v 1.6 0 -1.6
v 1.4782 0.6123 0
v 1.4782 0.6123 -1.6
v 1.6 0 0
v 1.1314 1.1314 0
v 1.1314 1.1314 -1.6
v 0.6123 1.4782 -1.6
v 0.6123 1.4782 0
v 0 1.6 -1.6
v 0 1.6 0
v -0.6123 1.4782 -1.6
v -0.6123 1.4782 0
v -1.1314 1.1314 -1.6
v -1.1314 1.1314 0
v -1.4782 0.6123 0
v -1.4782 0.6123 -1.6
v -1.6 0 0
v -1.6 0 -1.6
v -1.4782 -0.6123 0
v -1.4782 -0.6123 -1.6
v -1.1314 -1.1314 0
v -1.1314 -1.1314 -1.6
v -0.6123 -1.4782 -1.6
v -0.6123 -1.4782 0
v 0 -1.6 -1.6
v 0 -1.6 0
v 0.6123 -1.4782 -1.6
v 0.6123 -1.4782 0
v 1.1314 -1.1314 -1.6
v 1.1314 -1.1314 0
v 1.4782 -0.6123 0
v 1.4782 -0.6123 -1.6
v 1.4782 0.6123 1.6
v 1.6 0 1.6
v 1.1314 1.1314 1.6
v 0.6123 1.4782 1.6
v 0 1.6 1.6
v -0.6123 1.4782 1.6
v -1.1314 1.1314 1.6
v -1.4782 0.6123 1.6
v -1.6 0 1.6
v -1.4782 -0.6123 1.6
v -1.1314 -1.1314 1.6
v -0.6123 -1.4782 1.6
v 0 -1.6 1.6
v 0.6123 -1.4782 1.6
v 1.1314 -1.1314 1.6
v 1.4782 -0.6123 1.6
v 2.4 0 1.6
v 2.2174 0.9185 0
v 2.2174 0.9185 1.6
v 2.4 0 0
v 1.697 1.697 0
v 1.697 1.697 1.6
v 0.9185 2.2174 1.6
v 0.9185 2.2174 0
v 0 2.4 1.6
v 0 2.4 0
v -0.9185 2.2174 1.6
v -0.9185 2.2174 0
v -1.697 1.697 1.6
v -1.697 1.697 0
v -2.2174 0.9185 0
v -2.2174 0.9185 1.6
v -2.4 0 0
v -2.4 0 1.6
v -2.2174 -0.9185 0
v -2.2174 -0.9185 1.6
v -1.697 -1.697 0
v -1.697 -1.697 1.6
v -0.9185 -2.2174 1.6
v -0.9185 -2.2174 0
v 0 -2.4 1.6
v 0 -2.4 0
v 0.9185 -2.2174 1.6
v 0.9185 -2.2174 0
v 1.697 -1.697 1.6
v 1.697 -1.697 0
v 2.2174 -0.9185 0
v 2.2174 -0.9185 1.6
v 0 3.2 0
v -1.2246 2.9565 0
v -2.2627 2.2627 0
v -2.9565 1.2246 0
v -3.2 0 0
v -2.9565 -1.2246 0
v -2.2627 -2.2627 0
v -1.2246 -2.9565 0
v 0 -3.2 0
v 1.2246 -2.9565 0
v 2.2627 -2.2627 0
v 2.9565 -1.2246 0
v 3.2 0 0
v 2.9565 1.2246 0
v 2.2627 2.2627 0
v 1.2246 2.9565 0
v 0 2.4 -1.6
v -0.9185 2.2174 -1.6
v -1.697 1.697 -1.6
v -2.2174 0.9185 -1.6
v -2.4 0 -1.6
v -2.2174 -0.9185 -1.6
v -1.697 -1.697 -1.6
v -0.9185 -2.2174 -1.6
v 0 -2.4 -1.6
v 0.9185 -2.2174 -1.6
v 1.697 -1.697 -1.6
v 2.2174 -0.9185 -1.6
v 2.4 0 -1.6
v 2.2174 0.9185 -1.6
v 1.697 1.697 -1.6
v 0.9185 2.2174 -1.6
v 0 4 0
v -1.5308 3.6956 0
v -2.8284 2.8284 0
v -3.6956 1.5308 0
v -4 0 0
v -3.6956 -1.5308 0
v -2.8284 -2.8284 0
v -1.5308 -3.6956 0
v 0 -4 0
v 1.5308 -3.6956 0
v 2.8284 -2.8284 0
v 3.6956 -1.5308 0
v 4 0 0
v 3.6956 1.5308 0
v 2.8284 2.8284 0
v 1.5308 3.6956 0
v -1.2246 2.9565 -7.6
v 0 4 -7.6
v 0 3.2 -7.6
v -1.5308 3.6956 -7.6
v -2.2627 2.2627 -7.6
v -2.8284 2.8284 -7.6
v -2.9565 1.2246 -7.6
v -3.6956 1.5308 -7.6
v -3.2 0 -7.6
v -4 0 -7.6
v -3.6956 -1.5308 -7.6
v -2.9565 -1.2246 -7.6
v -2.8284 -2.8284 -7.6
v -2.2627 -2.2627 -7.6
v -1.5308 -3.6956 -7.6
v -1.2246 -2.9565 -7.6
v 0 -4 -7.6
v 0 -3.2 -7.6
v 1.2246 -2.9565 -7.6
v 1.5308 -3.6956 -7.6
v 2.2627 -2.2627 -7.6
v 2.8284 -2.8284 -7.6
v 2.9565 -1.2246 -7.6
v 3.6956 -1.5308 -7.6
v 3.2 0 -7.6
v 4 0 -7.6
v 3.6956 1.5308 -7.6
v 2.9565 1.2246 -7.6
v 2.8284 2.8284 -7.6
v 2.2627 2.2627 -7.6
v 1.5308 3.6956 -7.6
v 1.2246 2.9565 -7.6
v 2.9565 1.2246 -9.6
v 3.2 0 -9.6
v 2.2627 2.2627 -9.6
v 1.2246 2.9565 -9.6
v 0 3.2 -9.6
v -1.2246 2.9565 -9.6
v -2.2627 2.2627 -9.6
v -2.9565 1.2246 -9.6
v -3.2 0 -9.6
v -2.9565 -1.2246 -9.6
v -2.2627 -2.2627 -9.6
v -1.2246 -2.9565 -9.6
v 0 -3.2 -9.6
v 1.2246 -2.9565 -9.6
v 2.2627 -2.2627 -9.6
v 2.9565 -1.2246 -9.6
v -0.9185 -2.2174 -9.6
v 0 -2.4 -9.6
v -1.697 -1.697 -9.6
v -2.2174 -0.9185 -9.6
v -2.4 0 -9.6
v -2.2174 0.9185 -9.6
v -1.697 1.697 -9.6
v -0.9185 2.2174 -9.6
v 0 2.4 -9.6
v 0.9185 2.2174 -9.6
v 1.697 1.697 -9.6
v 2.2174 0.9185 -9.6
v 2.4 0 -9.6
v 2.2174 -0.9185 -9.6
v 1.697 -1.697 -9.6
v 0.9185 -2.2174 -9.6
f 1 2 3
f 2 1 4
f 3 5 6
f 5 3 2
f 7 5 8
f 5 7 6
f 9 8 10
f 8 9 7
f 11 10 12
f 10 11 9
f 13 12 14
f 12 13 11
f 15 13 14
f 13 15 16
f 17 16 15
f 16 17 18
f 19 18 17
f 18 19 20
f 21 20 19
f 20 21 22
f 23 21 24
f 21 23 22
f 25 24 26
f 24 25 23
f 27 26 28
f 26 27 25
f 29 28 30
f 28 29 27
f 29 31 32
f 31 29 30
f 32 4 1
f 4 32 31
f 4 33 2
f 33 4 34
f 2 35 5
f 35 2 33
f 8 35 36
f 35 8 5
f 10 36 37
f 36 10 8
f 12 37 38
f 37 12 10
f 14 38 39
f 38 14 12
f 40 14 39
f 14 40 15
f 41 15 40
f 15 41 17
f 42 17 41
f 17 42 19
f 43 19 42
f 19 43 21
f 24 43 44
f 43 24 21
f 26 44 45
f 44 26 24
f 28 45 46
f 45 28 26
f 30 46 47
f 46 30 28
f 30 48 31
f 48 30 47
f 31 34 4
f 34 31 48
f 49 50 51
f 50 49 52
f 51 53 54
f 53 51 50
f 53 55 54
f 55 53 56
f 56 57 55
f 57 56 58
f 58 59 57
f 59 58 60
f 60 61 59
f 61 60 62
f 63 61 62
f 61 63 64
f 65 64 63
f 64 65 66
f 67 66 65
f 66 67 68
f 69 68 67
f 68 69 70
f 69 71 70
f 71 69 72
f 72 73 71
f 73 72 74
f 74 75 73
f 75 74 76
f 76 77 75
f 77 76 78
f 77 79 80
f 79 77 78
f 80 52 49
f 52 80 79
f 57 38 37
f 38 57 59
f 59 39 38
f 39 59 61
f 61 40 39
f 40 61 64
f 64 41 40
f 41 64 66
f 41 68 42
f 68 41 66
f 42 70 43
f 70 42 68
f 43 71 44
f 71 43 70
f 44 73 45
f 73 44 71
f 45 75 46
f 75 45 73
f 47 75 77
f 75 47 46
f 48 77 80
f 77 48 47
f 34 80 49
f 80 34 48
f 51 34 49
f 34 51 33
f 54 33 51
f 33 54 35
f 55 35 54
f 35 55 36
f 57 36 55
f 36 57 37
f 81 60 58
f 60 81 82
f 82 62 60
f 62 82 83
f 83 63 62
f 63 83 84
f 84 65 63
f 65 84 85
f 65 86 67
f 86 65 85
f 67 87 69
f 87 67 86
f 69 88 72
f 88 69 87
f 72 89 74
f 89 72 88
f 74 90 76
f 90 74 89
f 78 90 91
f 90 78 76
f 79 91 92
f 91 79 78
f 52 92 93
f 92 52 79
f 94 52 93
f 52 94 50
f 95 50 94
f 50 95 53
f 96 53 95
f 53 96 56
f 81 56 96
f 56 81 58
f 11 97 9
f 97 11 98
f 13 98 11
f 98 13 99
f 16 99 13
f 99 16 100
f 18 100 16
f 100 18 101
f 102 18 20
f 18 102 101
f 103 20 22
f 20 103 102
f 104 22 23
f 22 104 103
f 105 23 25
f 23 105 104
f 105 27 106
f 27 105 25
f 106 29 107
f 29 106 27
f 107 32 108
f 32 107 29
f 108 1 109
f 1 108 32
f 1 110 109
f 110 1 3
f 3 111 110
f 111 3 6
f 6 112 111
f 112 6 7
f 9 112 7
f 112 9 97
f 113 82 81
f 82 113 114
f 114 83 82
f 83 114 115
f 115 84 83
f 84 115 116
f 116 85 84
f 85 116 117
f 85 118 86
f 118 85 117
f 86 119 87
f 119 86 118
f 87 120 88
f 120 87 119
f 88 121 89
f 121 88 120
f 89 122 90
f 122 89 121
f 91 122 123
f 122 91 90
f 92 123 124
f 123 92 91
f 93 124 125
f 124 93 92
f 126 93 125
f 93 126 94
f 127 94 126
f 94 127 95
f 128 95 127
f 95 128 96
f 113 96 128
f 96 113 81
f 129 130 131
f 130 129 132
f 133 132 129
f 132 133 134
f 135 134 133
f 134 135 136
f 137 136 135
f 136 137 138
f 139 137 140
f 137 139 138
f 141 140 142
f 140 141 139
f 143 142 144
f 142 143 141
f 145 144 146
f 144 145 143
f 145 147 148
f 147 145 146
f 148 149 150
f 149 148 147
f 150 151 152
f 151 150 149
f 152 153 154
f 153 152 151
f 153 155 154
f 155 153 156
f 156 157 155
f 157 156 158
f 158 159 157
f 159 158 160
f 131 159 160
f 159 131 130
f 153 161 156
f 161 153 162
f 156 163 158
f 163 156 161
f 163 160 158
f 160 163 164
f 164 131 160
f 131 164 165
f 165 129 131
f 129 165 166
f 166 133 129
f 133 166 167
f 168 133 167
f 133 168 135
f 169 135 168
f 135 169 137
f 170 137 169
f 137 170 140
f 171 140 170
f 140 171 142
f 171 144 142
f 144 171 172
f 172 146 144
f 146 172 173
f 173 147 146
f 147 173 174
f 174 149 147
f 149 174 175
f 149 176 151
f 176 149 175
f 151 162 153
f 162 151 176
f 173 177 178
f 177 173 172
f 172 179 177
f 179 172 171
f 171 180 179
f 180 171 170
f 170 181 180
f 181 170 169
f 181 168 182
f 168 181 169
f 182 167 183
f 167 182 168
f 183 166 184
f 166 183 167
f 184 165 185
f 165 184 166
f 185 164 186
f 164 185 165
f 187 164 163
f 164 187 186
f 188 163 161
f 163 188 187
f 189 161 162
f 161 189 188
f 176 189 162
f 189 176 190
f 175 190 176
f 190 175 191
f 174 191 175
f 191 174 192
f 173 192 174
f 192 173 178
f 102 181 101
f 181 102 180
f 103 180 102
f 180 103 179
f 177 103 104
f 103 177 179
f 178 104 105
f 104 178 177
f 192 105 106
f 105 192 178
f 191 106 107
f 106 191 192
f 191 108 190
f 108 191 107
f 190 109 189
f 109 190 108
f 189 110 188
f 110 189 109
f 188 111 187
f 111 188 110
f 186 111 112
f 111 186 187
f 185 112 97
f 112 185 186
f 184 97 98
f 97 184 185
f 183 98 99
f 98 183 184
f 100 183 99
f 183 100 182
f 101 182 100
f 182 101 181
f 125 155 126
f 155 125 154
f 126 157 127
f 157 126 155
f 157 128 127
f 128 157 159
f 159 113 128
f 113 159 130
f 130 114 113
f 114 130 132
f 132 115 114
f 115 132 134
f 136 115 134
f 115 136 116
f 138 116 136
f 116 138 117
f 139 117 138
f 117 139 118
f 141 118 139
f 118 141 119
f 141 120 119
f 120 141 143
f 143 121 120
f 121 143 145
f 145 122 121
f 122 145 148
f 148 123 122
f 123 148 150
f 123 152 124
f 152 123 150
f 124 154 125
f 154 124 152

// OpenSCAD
use <../lib.scad>
use <3062b.scad>
$fa=1; $fs=0.2;
function ldraw_lib__3062(realsolid=false) = [
// 0 ~Moved to 3062b
// 0 Name: 3062.dat
// 0 Author: [PTadmin]
// 0 !LDRAW_ORG Part UPDATE 1998-06
// 0 !LICENSE Licensed under CC BY 4.0 : see CAreadme.txt
// 
// 0 BFC CERTIFY CCW
  [0,"BFC","CERTIFY"],
  [0,"BFC","CCW"],
// 
// 0 !HISTORY 1998-06-20 [PTadmin] Official Update 1998-06
// 0 !HISTORY 2007-06-10 [PTadmin] Header formatted for Contributor Agreement
// 0 !HISTORY 2008-07-01 [PTadmin] Official Update 2008-01
// 
// 
// 1 16 0 0 0 1 0 0 0 1 0 0 0 1 3062b.dat
  [1,16,0,0,0,1,0,0,0,1,0,0,0,1, ldraw_lib__3062b(realsolid)],
];
module ldraw_lib__3062(step=0, col=false, unit=2/5, alt=false, line=0.2, solid=!$preview)
    makepoly(ldraw_lib__3062(solid), step=step, col=col, unit=unit, alt=alt, line=line, solid=solid);
ldraw_lib__3062(line=0.2);
